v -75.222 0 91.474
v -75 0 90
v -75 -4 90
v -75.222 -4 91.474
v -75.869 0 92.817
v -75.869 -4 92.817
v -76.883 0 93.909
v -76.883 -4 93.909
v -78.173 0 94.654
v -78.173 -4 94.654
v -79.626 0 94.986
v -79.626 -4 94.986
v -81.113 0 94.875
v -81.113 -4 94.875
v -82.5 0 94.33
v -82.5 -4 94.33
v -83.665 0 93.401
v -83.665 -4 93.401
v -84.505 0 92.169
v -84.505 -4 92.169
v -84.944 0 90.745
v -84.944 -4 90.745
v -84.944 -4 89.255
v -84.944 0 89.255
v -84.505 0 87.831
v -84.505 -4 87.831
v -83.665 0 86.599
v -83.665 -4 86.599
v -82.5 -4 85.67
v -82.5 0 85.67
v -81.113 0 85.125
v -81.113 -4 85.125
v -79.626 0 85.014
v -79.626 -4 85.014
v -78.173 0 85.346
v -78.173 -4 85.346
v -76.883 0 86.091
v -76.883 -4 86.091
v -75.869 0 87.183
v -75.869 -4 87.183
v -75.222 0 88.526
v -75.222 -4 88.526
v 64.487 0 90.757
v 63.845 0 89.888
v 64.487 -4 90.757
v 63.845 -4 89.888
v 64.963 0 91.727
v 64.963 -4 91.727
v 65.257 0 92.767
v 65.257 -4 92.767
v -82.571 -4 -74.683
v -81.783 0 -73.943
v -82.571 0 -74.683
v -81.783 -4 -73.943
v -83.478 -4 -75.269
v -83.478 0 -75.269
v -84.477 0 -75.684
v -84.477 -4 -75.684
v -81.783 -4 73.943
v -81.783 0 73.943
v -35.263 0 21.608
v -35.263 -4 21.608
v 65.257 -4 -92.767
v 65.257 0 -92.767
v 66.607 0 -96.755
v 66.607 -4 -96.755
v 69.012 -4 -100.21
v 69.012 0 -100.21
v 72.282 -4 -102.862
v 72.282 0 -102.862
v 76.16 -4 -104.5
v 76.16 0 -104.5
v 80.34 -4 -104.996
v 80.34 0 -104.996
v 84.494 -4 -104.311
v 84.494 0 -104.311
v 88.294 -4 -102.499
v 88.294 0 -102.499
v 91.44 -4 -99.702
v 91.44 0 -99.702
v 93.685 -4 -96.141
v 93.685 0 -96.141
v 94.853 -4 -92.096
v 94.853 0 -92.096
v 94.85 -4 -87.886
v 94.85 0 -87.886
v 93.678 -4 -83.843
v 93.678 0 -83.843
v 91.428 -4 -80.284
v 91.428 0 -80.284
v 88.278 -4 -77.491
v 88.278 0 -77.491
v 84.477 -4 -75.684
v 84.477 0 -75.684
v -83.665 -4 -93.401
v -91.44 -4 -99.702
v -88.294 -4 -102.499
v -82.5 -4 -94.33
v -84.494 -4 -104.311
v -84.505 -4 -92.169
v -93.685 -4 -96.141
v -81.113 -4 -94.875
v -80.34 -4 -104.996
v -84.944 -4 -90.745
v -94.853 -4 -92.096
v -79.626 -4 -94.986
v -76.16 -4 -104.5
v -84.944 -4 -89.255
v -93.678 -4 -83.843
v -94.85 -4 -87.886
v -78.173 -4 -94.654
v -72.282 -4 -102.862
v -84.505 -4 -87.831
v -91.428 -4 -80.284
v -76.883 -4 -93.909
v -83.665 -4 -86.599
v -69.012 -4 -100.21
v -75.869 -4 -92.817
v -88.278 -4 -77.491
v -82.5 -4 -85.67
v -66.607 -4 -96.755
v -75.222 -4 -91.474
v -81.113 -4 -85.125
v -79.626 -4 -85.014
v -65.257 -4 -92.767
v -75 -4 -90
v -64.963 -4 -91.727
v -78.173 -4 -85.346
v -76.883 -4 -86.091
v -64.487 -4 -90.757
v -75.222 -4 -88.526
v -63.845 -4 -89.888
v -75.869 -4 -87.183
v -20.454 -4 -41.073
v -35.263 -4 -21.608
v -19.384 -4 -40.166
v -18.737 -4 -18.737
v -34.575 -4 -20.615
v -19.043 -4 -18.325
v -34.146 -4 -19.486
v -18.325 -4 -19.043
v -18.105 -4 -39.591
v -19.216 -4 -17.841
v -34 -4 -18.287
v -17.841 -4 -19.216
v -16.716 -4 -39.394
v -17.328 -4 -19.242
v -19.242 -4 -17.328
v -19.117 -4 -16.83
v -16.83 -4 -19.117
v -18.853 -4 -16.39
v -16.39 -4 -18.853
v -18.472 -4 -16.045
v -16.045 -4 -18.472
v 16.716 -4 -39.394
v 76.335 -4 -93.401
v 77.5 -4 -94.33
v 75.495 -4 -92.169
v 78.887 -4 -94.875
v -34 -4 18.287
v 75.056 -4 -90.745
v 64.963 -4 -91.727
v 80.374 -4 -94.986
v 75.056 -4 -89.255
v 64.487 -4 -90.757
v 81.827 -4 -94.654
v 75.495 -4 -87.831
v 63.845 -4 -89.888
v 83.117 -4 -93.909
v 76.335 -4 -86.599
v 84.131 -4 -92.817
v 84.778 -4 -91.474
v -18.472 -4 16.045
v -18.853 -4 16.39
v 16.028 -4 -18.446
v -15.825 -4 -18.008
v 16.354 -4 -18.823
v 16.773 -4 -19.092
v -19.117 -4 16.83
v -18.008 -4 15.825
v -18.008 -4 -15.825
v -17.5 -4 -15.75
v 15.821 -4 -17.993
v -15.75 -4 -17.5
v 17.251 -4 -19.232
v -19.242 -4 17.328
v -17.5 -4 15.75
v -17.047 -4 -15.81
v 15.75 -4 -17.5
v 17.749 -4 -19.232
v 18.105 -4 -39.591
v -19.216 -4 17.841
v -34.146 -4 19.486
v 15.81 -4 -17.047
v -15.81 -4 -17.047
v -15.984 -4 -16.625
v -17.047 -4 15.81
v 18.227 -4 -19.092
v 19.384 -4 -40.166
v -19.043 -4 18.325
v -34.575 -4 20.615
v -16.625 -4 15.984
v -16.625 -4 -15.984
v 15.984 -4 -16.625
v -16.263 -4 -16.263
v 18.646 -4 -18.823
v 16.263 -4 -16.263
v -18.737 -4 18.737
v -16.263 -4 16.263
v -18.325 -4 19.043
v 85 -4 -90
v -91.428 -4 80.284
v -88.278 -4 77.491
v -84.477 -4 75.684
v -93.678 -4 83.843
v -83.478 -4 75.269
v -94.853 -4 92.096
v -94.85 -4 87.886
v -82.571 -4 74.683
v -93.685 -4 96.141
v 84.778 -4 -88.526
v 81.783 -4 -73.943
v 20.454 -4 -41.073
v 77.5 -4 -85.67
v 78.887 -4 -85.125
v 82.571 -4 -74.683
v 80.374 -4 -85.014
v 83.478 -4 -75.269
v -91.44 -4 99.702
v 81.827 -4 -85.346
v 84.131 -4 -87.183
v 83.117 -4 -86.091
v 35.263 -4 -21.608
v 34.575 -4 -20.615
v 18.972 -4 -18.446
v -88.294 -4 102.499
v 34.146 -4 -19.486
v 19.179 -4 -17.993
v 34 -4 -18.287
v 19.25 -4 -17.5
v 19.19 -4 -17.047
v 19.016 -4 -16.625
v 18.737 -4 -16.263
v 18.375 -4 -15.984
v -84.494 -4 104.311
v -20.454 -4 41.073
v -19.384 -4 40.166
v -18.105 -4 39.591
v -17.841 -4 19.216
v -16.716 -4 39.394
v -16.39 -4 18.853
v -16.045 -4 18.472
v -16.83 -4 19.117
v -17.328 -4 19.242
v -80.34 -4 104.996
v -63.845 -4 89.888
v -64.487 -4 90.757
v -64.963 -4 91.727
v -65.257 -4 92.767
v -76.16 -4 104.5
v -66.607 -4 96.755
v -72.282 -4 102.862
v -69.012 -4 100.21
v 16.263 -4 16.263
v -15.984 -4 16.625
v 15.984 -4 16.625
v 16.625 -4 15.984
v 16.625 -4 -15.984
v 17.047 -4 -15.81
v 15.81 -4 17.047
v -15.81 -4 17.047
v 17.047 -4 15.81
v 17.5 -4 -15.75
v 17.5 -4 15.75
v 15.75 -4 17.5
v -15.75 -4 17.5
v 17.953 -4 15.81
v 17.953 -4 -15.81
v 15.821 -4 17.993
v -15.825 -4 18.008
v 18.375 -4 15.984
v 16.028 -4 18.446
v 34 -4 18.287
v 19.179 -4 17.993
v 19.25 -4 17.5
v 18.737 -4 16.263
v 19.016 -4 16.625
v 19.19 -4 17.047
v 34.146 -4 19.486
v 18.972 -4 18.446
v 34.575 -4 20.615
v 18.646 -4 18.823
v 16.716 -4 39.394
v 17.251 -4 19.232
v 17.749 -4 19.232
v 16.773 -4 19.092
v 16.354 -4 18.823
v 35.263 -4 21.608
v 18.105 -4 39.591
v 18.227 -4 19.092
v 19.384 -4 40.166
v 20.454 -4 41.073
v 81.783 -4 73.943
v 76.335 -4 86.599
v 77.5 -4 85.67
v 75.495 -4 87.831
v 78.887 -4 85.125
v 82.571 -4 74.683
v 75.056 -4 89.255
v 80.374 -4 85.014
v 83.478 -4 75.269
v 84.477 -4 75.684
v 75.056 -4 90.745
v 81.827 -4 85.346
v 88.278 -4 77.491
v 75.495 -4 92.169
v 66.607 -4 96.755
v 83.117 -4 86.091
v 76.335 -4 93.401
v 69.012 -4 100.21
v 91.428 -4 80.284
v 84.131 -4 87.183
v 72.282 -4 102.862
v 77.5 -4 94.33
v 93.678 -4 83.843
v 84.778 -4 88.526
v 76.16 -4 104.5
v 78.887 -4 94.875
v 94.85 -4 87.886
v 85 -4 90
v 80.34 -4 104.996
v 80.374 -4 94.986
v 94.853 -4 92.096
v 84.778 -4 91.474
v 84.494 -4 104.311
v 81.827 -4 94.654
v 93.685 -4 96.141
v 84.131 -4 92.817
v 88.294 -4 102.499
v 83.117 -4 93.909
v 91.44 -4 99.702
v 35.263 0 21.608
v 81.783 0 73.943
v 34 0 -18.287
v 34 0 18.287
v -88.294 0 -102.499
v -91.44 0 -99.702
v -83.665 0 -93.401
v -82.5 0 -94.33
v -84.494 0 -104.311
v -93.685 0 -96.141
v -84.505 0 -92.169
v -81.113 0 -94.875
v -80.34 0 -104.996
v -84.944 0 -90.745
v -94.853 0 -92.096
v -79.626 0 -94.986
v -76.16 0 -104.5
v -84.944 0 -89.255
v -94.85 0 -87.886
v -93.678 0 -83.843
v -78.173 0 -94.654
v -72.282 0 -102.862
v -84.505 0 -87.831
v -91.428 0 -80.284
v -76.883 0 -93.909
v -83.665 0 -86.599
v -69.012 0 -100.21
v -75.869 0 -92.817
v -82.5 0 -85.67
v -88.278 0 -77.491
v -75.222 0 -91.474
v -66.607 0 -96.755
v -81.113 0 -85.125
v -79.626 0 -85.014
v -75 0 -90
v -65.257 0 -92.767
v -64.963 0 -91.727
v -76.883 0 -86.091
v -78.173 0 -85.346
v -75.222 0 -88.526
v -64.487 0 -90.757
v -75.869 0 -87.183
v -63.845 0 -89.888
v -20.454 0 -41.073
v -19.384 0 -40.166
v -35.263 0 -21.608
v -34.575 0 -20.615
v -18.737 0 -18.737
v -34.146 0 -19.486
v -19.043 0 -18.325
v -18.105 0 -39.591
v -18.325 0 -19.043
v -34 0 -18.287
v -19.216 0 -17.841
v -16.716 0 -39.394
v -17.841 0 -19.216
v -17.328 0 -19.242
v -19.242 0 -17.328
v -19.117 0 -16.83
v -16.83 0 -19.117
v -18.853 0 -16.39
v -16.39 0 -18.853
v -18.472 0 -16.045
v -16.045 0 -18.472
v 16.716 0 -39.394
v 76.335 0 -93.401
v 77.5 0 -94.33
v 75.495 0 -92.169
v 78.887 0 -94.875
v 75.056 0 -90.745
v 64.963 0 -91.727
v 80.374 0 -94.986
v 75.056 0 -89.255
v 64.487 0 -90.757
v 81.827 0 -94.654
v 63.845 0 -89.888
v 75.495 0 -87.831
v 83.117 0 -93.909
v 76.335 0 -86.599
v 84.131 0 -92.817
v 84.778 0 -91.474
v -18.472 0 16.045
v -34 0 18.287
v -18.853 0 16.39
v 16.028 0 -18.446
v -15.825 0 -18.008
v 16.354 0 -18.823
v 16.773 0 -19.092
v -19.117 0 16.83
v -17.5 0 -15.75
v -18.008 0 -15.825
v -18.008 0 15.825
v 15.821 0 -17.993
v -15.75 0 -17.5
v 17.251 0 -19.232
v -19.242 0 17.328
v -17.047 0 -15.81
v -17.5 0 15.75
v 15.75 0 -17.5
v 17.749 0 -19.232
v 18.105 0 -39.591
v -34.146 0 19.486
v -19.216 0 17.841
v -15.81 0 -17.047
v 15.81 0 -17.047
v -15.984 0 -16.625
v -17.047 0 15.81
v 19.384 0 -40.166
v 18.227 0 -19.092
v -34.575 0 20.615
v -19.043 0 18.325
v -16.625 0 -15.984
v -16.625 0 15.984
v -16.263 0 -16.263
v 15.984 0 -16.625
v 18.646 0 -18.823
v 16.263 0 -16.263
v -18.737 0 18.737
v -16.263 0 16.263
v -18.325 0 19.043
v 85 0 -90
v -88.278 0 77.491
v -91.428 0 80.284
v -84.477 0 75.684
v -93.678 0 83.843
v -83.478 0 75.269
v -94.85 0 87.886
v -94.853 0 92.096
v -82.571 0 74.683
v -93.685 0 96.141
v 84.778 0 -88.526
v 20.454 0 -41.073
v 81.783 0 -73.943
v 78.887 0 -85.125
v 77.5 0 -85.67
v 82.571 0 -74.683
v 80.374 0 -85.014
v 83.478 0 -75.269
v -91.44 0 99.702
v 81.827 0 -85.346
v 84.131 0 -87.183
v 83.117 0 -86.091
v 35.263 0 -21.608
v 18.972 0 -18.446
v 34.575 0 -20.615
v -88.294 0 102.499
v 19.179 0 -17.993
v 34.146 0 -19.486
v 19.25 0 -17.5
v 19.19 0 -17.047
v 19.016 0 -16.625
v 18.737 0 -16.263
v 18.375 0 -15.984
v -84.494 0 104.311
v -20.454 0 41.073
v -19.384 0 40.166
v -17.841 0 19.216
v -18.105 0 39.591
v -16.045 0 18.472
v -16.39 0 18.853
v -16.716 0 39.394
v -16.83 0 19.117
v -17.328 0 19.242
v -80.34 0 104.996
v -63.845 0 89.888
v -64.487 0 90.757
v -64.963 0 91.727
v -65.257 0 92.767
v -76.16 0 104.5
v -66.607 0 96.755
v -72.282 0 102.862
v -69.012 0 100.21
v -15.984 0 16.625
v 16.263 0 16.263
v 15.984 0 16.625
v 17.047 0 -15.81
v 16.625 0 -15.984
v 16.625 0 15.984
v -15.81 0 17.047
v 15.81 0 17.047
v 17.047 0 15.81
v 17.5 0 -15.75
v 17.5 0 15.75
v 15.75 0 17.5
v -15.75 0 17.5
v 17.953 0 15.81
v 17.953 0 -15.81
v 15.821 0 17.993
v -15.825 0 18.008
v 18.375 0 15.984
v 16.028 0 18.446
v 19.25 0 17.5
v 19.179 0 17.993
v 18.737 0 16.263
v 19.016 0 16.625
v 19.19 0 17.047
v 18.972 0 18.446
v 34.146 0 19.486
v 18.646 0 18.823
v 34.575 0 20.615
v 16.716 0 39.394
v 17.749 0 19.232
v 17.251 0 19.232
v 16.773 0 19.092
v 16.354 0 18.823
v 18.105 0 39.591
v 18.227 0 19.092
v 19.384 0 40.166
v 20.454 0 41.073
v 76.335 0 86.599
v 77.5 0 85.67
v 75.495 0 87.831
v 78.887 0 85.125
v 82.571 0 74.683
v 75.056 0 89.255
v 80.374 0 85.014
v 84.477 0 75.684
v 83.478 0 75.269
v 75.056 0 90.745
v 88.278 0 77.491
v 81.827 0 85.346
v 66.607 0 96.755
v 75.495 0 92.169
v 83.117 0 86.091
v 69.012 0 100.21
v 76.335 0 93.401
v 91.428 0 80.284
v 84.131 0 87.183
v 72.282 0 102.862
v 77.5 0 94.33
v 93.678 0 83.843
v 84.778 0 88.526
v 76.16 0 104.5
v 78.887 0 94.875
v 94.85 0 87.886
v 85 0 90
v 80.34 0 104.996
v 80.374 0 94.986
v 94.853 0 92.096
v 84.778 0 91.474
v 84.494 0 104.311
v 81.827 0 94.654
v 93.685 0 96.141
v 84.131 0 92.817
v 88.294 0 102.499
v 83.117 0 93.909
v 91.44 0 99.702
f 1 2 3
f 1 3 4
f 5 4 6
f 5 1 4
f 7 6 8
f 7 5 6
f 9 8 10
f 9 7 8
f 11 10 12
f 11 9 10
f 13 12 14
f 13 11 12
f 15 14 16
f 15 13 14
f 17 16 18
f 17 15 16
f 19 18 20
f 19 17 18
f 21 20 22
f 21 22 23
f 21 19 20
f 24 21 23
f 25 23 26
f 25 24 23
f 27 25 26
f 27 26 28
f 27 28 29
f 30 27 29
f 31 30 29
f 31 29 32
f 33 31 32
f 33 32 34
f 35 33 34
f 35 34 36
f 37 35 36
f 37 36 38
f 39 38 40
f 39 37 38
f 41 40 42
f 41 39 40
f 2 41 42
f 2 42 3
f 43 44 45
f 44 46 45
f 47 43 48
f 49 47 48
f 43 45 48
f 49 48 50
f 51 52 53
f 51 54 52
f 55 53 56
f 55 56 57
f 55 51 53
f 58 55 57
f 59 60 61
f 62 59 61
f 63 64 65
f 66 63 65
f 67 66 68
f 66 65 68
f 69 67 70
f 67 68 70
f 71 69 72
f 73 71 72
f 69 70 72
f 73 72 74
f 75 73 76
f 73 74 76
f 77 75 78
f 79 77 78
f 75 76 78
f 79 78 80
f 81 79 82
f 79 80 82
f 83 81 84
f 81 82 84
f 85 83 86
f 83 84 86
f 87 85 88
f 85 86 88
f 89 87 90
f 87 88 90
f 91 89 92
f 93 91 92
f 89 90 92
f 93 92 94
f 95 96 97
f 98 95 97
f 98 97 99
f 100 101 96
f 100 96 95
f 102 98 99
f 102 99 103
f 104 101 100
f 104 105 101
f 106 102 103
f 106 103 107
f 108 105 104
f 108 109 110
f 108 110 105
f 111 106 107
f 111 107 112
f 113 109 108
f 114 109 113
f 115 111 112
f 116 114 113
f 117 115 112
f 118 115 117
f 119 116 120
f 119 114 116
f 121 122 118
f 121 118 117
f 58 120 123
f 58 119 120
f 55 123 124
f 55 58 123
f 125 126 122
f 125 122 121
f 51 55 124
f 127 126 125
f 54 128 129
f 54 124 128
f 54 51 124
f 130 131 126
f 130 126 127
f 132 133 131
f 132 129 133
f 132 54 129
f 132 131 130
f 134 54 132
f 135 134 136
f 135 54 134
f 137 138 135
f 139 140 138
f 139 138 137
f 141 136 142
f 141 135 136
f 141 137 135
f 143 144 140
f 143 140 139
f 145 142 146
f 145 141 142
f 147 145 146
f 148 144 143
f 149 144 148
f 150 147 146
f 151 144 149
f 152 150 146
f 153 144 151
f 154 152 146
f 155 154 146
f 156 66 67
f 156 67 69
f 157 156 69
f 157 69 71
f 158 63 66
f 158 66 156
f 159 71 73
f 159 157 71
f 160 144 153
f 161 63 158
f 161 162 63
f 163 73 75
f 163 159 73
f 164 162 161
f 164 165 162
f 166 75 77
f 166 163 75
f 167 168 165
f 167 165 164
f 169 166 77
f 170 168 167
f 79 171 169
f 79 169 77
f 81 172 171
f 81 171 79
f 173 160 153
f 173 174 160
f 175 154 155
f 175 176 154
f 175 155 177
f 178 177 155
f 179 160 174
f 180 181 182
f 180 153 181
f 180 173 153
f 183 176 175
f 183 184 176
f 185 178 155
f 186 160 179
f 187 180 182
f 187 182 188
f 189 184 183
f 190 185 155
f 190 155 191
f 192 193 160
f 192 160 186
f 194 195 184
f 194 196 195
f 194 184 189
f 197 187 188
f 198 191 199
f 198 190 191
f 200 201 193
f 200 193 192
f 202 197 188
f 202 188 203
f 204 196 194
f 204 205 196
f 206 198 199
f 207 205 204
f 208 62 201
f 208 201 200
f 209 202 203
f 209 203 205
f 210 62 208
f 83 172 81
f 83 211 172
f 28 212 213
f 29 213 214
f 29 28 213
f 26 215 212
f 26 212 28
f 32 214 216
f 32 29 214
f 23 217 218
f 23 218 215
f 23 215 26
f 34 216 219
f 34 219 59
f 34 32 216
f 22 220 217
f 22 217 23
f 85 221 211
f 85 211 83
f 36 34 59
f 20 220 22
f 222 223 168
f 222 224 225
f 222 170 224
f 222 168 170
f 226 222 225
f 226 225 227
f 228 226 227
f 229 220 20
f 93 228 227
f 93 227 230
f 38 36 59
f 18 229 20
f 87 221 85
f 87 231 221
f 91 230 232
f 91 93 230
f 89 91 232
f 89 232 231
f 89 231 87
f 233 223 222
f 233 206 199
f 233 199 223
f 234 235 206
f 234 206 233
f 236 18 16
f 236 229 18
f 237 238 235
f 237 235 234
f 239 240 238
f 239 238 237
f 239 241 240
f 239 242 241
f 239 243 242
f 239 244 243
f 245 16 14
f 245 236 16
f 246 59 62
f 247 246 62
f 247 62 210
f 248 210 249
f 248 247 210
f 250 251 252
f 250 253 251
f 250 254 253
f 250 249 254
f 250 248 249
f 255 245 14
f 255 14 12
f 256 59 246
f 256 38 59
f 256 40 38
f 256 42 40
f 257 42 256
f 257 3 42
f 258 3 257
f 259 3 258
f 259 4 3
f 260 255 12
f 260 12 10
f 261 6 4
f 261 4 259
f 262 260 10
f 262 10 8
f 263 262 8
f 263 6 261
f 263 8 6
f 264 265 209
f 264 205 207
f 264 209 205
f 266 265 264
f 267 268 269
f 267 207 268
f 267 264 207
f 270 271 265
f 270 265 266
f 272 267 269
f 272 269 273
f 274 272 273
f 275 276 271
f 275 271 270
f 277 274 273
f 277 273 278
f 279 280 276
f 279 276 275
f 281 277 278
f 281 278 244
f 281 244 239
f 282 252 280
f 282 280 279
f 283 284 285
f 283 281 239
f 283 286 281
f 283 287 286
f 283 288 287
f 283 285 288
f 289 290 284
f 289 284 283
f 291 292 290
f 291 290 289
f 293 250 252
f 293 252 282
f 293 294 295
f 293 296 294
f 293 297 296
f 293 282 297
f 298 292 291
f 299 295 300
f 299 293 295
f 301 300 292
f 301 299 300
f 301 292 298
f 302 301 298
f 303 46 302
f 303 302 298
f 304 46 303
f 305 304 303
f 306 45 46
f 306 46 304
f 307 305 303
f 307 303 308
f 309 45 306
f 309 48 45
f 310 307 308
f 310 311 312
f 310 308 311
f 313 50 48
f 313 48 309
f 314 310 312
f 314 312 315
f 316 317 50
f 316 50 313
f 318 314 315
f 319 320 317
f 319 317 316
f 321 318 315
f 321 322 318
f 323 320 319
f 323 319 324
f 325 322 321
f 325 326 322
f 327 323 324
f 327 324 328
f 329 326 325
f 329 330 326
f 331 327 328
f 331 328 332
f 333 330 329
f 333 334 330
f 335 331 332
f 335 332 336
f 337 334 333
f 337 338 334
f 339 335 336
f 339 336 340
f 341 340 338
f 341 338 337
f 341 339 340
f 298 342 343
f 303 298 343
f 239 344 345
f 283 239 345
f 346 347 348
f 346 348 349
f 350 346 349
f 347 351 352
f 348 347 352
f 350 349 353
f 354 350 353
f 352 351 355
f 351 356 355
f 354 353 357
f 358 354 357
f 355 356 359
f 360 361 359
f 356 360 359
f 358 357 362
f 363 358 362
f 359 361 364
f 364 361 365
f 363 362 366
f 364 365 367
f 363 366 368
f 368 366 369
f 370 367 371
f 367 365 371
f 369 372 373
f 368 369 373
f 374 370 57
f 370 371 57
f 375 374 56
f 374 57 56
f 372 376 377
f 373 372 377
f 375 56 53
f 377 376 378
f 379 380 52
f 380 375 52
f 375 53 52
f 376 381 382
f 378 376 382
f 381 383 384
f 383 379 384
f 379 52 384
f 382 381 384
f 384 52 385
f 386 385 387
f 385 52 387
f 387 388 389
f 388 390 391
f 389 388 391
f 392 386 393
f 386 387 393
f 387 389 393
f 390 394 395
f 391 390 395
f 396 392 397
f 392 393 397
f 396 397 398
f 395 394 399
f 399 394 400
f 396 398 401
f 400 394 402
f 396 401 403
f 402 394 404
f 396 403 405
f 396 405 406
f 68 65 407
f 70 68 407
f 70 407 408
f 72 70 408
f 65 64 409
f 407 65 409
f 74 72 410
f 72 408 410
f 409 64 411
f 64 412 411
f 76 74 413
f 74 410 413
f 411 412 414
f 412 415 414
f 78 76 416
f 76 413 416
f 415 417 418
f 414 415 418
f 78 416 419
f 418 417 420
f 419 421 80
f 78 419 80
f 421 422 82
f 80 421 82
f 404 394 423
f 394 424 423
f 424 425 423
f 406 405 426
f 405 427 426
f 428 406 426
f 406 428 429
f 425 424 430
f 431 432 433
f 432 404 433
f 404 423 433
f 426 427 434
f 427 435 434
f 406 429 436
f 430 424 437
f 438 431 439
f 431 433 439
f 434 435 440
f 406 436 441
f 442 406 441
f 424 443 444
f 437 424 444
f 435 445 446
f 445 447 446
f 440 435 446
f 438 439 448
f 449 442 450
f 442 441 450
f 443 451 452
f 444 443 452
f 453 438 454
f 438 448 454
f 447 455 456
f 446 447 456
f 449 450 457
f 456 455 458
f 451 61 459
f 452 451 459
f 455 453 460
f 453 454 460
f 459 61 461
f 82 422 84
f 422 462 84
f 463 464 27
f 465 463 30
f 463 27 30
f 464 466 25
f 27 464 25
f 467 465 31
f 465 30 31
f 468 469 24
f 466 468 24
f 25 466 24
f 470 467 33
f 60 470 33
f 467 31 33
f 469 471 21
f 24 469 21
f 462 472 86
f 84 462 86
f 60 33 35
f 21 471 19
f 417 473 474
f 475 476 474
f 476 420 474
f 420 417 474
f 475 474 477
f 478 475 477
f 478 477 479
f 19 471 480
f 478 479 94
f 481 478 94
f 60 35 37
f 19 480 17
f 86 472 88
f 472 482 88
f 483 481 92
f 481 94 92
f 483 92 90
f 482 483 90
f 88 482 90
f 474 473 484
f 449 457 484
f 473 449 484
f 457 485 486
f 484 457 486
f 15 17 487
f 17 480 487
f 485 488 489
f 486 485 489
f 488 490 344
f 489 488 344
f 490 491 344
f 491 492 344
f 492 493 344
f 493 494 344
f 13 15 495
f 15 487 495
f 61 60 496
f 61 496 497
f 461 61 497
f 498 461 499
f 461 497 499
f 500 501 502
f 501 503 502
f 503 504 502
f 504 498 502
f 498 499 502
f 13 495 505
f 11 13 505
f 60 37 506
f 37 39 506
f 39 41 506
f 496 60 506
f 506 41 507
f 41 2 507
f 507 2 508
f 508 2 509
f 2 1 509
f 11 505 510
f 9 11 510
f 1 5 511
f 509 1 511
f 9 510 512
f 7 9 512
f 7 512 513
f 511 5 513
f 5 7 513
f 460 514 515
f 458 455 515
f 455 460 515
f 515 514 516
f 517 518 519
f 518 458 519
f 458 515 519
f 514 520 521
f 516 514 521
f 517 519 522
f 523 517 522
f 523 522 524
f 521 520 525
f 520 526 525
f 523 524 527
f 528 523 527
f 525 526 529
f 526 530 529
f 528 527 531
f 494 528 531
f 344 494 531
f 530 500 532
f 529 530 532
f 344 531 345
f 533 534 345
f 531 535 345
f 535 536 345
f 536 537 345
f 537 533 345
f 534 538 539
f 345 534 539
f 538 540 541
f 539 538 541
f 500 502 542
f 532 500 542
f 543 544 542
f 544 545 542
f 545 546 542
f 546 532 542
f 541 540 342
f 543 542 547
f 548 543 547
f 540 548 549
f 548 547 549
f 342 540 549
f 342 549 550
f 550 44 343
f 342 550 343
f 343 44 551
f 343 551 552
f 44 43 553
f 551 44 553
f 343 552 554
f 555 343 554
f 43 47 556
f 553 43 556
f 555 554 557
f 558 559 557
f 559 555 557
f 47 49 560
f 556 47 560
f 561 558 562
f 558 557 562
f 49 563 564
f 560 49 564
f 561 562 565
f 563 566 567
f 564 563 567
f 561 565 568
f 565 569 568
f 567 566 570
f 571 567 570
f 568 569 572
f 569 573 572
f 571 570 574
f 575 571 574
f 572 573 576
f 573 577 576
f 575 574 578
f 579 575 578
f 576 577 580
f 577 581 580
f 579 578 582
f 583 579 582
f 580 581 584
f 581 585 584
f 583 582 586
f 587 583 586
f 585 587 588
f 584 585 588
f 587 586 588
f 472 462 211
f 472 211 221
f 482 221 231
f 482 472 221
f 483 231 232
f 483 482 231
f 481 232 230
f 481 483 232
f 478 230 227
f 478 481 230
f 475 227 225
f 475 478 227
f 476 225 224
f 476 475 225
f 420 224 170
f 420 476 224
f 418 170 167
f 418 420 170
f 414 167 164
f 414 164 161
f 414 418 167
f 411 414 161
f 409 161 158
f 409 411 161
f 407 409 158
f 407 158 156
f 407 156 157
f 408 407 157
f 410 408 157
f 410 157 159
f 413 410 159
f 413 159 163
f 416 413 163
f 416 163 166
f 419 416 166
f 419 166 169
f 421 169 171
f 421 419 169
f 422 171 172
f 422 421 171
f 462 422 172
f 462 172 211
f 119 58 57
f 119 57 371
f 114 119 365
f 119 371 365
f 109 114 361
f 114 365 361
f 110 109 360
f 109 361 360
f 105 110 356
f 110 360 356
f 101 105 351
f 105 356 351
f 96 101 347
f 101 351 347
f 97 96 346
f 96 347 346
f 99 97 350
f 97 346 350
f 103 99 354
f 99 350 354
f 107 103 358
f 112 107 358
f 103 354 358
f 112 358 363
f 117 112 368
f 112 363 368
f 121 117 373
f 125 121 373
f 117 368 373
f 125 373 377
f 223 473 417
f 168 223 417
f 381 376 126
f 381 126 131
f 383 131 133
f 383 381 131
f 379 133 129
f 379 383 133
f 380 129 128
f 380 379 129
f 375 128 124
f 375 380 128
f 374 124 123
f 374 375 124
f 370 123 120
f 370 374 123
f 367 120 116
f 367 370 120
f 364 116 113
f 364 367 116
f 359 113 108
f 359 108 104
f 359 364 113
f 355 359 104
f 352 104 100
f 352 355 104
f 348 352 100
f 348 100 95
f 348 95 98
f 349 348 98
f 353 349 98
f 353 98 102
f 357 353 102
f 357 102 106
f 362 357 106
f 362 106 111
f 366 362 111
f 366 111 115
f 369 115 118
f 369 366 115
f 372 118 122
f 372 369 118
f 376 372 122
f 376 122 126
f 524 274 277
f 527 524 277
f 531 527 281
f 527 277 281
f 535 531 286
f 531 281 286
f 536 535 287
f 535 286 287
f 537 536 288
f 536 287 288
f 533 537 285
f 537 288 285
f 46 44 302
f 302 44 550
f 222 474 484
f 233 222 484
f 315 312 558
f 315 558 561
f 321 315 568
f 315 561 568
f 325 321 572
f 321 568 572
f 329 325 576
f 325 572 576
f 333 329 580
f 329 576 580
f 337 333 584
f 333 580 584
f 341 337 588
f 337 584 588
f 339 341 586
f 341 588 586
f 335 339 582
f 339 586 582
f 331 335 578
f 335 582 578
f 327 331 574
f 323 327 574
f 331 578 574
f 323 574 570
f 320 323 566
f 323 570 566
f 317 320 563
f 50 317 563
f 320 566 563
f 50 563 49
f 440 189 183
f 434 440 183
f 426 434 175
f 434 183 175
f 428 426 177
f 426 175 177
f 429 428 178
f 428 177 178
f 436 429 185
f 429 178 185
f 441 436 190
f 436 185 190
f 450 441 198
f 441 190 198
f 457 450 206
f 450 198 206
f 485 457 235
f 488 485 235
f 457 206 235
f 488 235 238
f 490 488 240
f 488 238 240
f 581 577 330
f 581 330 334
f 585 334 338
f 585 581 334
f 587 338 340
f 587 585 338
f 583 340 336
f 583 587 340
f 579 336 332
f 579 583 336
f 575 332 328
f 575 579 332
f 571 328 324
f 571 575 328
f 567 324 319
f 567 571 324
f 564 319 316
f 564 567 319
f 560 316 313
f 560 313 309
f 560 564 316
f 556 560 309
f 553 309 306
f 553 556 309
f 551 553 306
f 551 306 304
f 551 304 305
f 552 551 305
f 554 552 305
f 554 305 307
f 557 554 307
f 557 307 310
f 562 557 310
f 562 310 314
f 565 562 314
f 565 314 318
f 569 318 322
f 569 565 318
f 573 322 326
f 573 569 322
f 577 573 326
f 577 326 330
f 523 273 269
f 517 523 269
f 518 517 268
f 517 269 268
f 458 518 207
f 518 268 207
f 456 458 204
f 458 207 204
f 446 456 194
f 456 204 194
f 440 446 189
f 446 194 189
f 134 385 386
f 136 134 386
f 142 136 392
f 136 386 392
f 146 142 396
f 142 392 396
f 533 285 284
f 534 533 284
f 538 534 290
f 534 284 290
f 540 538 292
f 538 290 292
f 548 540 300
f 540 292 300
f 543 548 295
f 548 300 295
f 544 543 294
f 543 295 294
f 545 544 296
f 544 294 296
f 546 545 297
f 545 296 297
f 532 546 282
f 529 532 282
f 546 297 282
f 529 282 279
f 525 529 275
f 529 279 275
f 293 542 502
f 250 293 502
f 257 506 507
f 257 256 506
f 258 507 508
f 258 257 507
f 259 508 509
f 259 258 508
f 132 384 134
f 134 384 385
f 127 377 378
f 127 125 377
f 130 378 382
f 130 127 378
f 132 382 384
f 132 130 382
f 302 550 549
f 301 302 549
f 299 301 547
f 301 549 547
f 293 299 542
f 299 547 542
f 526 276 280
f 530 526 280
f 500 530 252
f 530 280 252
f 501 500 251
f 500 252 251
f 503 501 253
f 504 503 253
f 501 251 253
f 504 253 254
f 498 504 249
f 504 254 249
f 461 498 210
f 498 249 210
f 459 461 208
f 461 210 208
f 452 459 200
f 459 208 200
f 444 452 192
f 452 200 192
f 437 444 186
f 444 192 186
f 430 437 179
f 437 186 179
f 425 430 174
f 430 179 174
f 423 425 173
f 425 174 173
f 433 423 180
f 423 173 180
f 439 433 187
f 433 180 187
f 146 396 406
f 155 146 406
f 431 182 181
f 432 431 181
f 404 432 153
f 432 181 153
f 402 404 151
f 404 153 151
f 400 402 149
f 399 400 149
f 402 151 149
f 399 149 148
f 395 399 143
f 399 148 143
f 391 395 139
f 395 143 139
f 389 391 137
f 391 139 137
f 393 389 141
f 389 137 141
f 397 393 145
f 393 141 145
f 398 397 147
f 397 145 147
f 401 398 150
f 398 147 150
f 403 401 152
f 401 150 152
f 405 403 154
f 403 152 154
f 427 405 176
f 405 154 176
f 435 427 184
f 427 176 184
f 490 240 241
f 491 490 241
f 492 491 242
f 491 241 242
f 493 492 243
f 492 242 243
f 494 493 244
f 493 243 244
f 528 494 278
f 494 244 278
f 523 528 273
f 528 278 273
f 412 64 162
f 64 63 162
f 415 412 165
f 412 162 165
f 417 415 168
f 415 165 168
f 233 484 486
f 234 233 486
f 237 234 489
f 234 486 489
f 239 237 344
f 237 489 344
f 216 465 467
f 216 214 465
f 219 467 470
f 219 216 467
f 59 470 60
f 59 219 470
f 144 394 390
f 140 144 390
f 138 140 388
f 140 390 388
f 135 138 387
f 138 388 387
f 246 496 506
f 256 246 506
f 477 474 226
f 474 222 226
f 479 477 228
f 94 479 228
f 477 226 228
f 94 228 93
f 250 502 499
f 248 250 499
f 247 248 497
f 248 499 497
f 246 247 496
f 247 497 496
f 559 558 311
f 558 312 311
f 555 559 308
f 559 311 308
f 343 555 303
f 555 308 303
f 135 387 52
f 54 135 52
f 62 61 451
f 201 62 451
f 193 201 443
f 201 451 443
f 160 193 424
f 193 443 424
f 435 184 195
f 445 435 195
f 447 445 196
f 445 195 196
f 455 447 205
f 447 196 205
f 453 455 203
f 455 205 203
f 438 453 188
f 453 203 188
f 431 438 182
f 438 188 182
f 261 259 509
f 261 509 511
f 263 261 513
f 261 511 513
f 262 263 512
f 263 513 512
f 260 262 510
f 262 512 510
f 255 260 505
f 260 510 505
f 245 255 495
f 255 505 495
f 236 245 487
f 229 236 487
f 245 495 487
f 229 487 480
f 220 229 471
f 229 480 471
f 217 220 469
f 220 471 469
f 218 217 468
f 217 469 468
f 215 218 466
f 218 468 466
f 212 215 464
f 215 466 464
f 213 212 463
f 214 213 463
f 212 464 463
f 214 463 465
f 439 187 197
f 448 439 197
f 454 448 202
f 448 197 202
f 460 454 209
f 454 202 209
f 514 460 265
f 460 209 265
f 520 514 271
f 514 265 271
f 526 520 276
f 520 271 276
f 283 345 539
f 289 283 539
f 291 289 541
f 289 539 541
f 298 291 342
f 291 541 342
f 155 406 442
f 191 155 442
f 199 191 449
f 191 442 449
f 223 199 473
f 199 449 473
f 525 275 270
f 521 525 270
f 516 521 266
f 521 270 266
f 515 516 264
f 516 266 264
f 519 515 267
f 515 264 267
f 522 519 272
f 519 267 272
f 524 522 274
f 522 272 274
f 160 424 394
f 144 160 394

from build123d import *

# Parameters (mm, degrees)
F0_R     = 5
F1_DEPTH = 4
F2_DEPTH = 25
F3_R     = 6


with BuildPart() as f1:
    # F0 (on Front) → F1 (new body)
    with BuildSketch(Plane.XZ):
        with BuildLine():
            Line((-20.45353, 41.072611), (-65.051813, 91.24568))
            ThreePointArc((-65.051813, 91.24568), (-89.965457, 101.21114), (-82.989636, 75.30095))
            Line((-82.989636, 75.30095), (-35.262953, 21.608432))
            ThreePointArc((-35.262953, 21.608432), (-34.326391, 20.063516), (-34, 18.286613))
            Line((-34, 18.286613), (-34, -18.286613))
            ThreePointArc((-34, -18.286613), (-34.326391, -20.063516), (-35.262953, -21.608432))
            Line((-35.262953, -21.608432), (-82.989636, -75.30095))
            ThreePointArc((-82.989636, -75.30095), (-89.965457, -101.21114), (-65.051813, -91.24568))
            Line((-65.051813, -91.24568), (-20.45353, -41.072611))
            ThreePointArc((-20.45353, -41.072611), (-18.764763, -39.83323), (-16.716483, -39.39443))
            Line((-16.716483, -39.39443), (16.716483, -39.39443))
            ThreePointArc((16.716483, -39.39443), (18.764763, -39.83323), (20.45353, -41.072611))
            Line((20.45353, -41.072611), (65.051813, -91.24568))
            ThreePointArc((65.051813, -91.24568), (89.965457, -101.21114), (82.989636, -75.30095))
            Line((82.989636, -75.30095), (35.262953, -21.608432))
            ThreePointArc((35.262953, -21.608432), (34.326391, -20.063516), (34, -18.286613))
            Line((34, -18.286613), (34, 18.286613))
            ThreePointArc((34, 18.286613), (34.326391, 20.063516), (35.262953, 21.608432))
            Line((35.262953, 21.608432), (82.989636, 75.30095))
            ThreePointArc((82.989636, 75.30095), (89.965457, 101.21114), (65.051813, 91.24568))
            Line((65.051813, 91.24568), (20.45353, 41.072611))
            ThreePointArc((20.45353, 41.072611), (18.764763, 39.83323), (16.716483, 39.39443))
            Line((16.716483, 39.39443), (-16.716483, 39.39443))
            ThreePointArc((-16.716483, 39.39443), (-18.764763, 39.83323), (-20.45353, 41.072611))
        make_face()
        with Locations((-80, -90)):
            Circle(F0_R, mode=Mode.SUBTRACT)
        with Locations((80, -90)):
            Circle(F0_R, mode=Mode.SUBTRACT)
        with Locations((-80, 90)):
            Circle(F0_R, mode=Mode.SUBTRACT)
        with Locations((80, 90)):
            Circle(F0_R, mode=Mode.SUBTRACT)
    extrude(amount=F1_DEPTH)

    # F4 (on face) → F2 (cut)
    with BuildSketch(Plane.XZ.offset(4)):
        with BuildLine():
            ThreePointArc((19.25, 17.5), (17.5, 19.25), (15.75, 17.5))
            Line((15.75, 17.5), (17.5, 17.5))
            Line((17.5, 17.5), (17.5, 15.75))
            ThreePointArc((17.5, 15.75), (18.737437, 16.262563), (19.25, 17.5))
        make_face()
        with BuildLine():
            Line((-17.5, 17.5), (-15.75, 17.5))
            ThreePointArc((-15.75, 17.5), (-18.737437, 18.737437), (-17.5, 15.75))
            Line((-17.5, 15.75), (-17.5, 17.5))
        make_face()
        with BuildLine():
            ThreePointArc((-17.5, 15.75), (-16.262563, 16.262563), (-15.75, 17.5))
            Line((-15.75, 17.5), (-17.5, 17.5))
            Line((-17.5, 17.5), (-17.5, 15.75))
        make_face()
        with BuildLine():
            Line((17.5, 17.5), (15.75, 17.5))
            ThreePointArc((15.75, 17.5), (16.262563, 16.262563), (17.5, 15.75))
            Line((17.5, 15.75), (17.5, 17.5))
        make_face()
        with BuildLine():
            ThreePointArc((-15.75, -17.5), (-16.262563, -16.262563), (-17.5, -15.75))
            Line((-17.5, -15.75), (-17.5, -17.5))
            Line((-17.5, -17.5), (-15.75, -17.5))
        make_face()
        with BuildLine():
            Line((-17.5, -17.5), (-17.5, -15.75))
            ThreePointArc((-17.5, -15.75), (-18.737437, -18.737437), (-15.75, -17.5))
            Line((-15.75, -17.5), (-17.5, -17.5))
        make_face()
        with BuildLine():
            Line((17.5, -17.5), (17.5, -15.75))
            ThreePointArc((17.5, -15.75), (16.262563, -16.262563), (15.75, -17.5))
            Line((15.75, -17.5), (17.5, -17.5))
        make_face()
        with BuildLine():
            ThreePointArc((19.25, -17.5), (18.737437, -16.262563), (17.5, -15.75))
            Line((17.5, -15.75), (17.5, -17.5))
            Line((17.5, -17.5), (15.75, -17.5))
            ThreePointArc((15.75, -17.5), (17.5, -19.25), (19.25, -17.5))
        make_face()
    extrude(amount=-F2_DEPTH, mode=Mode.SUBTRACT)

    # F3
    f3_edges = [f1.edges().sort_by_distance(p)[0] for p in [
        (82.989636, -2, -75.30095),
        (65.051813, -2, -91.24568),
        (-82.989636, -2, -75.30095),
        (-65.051813, -2, -91.24568),
        (65.051813, -2, 91.24568),
        (82.989636, -2, 75.30095),
        (-82.989636, -2, 75.30095),
        (-65.051813, -2, 91.24568),
    ]]
    fillet(f3_edges, radius=F3_R)


solid = f1.part
